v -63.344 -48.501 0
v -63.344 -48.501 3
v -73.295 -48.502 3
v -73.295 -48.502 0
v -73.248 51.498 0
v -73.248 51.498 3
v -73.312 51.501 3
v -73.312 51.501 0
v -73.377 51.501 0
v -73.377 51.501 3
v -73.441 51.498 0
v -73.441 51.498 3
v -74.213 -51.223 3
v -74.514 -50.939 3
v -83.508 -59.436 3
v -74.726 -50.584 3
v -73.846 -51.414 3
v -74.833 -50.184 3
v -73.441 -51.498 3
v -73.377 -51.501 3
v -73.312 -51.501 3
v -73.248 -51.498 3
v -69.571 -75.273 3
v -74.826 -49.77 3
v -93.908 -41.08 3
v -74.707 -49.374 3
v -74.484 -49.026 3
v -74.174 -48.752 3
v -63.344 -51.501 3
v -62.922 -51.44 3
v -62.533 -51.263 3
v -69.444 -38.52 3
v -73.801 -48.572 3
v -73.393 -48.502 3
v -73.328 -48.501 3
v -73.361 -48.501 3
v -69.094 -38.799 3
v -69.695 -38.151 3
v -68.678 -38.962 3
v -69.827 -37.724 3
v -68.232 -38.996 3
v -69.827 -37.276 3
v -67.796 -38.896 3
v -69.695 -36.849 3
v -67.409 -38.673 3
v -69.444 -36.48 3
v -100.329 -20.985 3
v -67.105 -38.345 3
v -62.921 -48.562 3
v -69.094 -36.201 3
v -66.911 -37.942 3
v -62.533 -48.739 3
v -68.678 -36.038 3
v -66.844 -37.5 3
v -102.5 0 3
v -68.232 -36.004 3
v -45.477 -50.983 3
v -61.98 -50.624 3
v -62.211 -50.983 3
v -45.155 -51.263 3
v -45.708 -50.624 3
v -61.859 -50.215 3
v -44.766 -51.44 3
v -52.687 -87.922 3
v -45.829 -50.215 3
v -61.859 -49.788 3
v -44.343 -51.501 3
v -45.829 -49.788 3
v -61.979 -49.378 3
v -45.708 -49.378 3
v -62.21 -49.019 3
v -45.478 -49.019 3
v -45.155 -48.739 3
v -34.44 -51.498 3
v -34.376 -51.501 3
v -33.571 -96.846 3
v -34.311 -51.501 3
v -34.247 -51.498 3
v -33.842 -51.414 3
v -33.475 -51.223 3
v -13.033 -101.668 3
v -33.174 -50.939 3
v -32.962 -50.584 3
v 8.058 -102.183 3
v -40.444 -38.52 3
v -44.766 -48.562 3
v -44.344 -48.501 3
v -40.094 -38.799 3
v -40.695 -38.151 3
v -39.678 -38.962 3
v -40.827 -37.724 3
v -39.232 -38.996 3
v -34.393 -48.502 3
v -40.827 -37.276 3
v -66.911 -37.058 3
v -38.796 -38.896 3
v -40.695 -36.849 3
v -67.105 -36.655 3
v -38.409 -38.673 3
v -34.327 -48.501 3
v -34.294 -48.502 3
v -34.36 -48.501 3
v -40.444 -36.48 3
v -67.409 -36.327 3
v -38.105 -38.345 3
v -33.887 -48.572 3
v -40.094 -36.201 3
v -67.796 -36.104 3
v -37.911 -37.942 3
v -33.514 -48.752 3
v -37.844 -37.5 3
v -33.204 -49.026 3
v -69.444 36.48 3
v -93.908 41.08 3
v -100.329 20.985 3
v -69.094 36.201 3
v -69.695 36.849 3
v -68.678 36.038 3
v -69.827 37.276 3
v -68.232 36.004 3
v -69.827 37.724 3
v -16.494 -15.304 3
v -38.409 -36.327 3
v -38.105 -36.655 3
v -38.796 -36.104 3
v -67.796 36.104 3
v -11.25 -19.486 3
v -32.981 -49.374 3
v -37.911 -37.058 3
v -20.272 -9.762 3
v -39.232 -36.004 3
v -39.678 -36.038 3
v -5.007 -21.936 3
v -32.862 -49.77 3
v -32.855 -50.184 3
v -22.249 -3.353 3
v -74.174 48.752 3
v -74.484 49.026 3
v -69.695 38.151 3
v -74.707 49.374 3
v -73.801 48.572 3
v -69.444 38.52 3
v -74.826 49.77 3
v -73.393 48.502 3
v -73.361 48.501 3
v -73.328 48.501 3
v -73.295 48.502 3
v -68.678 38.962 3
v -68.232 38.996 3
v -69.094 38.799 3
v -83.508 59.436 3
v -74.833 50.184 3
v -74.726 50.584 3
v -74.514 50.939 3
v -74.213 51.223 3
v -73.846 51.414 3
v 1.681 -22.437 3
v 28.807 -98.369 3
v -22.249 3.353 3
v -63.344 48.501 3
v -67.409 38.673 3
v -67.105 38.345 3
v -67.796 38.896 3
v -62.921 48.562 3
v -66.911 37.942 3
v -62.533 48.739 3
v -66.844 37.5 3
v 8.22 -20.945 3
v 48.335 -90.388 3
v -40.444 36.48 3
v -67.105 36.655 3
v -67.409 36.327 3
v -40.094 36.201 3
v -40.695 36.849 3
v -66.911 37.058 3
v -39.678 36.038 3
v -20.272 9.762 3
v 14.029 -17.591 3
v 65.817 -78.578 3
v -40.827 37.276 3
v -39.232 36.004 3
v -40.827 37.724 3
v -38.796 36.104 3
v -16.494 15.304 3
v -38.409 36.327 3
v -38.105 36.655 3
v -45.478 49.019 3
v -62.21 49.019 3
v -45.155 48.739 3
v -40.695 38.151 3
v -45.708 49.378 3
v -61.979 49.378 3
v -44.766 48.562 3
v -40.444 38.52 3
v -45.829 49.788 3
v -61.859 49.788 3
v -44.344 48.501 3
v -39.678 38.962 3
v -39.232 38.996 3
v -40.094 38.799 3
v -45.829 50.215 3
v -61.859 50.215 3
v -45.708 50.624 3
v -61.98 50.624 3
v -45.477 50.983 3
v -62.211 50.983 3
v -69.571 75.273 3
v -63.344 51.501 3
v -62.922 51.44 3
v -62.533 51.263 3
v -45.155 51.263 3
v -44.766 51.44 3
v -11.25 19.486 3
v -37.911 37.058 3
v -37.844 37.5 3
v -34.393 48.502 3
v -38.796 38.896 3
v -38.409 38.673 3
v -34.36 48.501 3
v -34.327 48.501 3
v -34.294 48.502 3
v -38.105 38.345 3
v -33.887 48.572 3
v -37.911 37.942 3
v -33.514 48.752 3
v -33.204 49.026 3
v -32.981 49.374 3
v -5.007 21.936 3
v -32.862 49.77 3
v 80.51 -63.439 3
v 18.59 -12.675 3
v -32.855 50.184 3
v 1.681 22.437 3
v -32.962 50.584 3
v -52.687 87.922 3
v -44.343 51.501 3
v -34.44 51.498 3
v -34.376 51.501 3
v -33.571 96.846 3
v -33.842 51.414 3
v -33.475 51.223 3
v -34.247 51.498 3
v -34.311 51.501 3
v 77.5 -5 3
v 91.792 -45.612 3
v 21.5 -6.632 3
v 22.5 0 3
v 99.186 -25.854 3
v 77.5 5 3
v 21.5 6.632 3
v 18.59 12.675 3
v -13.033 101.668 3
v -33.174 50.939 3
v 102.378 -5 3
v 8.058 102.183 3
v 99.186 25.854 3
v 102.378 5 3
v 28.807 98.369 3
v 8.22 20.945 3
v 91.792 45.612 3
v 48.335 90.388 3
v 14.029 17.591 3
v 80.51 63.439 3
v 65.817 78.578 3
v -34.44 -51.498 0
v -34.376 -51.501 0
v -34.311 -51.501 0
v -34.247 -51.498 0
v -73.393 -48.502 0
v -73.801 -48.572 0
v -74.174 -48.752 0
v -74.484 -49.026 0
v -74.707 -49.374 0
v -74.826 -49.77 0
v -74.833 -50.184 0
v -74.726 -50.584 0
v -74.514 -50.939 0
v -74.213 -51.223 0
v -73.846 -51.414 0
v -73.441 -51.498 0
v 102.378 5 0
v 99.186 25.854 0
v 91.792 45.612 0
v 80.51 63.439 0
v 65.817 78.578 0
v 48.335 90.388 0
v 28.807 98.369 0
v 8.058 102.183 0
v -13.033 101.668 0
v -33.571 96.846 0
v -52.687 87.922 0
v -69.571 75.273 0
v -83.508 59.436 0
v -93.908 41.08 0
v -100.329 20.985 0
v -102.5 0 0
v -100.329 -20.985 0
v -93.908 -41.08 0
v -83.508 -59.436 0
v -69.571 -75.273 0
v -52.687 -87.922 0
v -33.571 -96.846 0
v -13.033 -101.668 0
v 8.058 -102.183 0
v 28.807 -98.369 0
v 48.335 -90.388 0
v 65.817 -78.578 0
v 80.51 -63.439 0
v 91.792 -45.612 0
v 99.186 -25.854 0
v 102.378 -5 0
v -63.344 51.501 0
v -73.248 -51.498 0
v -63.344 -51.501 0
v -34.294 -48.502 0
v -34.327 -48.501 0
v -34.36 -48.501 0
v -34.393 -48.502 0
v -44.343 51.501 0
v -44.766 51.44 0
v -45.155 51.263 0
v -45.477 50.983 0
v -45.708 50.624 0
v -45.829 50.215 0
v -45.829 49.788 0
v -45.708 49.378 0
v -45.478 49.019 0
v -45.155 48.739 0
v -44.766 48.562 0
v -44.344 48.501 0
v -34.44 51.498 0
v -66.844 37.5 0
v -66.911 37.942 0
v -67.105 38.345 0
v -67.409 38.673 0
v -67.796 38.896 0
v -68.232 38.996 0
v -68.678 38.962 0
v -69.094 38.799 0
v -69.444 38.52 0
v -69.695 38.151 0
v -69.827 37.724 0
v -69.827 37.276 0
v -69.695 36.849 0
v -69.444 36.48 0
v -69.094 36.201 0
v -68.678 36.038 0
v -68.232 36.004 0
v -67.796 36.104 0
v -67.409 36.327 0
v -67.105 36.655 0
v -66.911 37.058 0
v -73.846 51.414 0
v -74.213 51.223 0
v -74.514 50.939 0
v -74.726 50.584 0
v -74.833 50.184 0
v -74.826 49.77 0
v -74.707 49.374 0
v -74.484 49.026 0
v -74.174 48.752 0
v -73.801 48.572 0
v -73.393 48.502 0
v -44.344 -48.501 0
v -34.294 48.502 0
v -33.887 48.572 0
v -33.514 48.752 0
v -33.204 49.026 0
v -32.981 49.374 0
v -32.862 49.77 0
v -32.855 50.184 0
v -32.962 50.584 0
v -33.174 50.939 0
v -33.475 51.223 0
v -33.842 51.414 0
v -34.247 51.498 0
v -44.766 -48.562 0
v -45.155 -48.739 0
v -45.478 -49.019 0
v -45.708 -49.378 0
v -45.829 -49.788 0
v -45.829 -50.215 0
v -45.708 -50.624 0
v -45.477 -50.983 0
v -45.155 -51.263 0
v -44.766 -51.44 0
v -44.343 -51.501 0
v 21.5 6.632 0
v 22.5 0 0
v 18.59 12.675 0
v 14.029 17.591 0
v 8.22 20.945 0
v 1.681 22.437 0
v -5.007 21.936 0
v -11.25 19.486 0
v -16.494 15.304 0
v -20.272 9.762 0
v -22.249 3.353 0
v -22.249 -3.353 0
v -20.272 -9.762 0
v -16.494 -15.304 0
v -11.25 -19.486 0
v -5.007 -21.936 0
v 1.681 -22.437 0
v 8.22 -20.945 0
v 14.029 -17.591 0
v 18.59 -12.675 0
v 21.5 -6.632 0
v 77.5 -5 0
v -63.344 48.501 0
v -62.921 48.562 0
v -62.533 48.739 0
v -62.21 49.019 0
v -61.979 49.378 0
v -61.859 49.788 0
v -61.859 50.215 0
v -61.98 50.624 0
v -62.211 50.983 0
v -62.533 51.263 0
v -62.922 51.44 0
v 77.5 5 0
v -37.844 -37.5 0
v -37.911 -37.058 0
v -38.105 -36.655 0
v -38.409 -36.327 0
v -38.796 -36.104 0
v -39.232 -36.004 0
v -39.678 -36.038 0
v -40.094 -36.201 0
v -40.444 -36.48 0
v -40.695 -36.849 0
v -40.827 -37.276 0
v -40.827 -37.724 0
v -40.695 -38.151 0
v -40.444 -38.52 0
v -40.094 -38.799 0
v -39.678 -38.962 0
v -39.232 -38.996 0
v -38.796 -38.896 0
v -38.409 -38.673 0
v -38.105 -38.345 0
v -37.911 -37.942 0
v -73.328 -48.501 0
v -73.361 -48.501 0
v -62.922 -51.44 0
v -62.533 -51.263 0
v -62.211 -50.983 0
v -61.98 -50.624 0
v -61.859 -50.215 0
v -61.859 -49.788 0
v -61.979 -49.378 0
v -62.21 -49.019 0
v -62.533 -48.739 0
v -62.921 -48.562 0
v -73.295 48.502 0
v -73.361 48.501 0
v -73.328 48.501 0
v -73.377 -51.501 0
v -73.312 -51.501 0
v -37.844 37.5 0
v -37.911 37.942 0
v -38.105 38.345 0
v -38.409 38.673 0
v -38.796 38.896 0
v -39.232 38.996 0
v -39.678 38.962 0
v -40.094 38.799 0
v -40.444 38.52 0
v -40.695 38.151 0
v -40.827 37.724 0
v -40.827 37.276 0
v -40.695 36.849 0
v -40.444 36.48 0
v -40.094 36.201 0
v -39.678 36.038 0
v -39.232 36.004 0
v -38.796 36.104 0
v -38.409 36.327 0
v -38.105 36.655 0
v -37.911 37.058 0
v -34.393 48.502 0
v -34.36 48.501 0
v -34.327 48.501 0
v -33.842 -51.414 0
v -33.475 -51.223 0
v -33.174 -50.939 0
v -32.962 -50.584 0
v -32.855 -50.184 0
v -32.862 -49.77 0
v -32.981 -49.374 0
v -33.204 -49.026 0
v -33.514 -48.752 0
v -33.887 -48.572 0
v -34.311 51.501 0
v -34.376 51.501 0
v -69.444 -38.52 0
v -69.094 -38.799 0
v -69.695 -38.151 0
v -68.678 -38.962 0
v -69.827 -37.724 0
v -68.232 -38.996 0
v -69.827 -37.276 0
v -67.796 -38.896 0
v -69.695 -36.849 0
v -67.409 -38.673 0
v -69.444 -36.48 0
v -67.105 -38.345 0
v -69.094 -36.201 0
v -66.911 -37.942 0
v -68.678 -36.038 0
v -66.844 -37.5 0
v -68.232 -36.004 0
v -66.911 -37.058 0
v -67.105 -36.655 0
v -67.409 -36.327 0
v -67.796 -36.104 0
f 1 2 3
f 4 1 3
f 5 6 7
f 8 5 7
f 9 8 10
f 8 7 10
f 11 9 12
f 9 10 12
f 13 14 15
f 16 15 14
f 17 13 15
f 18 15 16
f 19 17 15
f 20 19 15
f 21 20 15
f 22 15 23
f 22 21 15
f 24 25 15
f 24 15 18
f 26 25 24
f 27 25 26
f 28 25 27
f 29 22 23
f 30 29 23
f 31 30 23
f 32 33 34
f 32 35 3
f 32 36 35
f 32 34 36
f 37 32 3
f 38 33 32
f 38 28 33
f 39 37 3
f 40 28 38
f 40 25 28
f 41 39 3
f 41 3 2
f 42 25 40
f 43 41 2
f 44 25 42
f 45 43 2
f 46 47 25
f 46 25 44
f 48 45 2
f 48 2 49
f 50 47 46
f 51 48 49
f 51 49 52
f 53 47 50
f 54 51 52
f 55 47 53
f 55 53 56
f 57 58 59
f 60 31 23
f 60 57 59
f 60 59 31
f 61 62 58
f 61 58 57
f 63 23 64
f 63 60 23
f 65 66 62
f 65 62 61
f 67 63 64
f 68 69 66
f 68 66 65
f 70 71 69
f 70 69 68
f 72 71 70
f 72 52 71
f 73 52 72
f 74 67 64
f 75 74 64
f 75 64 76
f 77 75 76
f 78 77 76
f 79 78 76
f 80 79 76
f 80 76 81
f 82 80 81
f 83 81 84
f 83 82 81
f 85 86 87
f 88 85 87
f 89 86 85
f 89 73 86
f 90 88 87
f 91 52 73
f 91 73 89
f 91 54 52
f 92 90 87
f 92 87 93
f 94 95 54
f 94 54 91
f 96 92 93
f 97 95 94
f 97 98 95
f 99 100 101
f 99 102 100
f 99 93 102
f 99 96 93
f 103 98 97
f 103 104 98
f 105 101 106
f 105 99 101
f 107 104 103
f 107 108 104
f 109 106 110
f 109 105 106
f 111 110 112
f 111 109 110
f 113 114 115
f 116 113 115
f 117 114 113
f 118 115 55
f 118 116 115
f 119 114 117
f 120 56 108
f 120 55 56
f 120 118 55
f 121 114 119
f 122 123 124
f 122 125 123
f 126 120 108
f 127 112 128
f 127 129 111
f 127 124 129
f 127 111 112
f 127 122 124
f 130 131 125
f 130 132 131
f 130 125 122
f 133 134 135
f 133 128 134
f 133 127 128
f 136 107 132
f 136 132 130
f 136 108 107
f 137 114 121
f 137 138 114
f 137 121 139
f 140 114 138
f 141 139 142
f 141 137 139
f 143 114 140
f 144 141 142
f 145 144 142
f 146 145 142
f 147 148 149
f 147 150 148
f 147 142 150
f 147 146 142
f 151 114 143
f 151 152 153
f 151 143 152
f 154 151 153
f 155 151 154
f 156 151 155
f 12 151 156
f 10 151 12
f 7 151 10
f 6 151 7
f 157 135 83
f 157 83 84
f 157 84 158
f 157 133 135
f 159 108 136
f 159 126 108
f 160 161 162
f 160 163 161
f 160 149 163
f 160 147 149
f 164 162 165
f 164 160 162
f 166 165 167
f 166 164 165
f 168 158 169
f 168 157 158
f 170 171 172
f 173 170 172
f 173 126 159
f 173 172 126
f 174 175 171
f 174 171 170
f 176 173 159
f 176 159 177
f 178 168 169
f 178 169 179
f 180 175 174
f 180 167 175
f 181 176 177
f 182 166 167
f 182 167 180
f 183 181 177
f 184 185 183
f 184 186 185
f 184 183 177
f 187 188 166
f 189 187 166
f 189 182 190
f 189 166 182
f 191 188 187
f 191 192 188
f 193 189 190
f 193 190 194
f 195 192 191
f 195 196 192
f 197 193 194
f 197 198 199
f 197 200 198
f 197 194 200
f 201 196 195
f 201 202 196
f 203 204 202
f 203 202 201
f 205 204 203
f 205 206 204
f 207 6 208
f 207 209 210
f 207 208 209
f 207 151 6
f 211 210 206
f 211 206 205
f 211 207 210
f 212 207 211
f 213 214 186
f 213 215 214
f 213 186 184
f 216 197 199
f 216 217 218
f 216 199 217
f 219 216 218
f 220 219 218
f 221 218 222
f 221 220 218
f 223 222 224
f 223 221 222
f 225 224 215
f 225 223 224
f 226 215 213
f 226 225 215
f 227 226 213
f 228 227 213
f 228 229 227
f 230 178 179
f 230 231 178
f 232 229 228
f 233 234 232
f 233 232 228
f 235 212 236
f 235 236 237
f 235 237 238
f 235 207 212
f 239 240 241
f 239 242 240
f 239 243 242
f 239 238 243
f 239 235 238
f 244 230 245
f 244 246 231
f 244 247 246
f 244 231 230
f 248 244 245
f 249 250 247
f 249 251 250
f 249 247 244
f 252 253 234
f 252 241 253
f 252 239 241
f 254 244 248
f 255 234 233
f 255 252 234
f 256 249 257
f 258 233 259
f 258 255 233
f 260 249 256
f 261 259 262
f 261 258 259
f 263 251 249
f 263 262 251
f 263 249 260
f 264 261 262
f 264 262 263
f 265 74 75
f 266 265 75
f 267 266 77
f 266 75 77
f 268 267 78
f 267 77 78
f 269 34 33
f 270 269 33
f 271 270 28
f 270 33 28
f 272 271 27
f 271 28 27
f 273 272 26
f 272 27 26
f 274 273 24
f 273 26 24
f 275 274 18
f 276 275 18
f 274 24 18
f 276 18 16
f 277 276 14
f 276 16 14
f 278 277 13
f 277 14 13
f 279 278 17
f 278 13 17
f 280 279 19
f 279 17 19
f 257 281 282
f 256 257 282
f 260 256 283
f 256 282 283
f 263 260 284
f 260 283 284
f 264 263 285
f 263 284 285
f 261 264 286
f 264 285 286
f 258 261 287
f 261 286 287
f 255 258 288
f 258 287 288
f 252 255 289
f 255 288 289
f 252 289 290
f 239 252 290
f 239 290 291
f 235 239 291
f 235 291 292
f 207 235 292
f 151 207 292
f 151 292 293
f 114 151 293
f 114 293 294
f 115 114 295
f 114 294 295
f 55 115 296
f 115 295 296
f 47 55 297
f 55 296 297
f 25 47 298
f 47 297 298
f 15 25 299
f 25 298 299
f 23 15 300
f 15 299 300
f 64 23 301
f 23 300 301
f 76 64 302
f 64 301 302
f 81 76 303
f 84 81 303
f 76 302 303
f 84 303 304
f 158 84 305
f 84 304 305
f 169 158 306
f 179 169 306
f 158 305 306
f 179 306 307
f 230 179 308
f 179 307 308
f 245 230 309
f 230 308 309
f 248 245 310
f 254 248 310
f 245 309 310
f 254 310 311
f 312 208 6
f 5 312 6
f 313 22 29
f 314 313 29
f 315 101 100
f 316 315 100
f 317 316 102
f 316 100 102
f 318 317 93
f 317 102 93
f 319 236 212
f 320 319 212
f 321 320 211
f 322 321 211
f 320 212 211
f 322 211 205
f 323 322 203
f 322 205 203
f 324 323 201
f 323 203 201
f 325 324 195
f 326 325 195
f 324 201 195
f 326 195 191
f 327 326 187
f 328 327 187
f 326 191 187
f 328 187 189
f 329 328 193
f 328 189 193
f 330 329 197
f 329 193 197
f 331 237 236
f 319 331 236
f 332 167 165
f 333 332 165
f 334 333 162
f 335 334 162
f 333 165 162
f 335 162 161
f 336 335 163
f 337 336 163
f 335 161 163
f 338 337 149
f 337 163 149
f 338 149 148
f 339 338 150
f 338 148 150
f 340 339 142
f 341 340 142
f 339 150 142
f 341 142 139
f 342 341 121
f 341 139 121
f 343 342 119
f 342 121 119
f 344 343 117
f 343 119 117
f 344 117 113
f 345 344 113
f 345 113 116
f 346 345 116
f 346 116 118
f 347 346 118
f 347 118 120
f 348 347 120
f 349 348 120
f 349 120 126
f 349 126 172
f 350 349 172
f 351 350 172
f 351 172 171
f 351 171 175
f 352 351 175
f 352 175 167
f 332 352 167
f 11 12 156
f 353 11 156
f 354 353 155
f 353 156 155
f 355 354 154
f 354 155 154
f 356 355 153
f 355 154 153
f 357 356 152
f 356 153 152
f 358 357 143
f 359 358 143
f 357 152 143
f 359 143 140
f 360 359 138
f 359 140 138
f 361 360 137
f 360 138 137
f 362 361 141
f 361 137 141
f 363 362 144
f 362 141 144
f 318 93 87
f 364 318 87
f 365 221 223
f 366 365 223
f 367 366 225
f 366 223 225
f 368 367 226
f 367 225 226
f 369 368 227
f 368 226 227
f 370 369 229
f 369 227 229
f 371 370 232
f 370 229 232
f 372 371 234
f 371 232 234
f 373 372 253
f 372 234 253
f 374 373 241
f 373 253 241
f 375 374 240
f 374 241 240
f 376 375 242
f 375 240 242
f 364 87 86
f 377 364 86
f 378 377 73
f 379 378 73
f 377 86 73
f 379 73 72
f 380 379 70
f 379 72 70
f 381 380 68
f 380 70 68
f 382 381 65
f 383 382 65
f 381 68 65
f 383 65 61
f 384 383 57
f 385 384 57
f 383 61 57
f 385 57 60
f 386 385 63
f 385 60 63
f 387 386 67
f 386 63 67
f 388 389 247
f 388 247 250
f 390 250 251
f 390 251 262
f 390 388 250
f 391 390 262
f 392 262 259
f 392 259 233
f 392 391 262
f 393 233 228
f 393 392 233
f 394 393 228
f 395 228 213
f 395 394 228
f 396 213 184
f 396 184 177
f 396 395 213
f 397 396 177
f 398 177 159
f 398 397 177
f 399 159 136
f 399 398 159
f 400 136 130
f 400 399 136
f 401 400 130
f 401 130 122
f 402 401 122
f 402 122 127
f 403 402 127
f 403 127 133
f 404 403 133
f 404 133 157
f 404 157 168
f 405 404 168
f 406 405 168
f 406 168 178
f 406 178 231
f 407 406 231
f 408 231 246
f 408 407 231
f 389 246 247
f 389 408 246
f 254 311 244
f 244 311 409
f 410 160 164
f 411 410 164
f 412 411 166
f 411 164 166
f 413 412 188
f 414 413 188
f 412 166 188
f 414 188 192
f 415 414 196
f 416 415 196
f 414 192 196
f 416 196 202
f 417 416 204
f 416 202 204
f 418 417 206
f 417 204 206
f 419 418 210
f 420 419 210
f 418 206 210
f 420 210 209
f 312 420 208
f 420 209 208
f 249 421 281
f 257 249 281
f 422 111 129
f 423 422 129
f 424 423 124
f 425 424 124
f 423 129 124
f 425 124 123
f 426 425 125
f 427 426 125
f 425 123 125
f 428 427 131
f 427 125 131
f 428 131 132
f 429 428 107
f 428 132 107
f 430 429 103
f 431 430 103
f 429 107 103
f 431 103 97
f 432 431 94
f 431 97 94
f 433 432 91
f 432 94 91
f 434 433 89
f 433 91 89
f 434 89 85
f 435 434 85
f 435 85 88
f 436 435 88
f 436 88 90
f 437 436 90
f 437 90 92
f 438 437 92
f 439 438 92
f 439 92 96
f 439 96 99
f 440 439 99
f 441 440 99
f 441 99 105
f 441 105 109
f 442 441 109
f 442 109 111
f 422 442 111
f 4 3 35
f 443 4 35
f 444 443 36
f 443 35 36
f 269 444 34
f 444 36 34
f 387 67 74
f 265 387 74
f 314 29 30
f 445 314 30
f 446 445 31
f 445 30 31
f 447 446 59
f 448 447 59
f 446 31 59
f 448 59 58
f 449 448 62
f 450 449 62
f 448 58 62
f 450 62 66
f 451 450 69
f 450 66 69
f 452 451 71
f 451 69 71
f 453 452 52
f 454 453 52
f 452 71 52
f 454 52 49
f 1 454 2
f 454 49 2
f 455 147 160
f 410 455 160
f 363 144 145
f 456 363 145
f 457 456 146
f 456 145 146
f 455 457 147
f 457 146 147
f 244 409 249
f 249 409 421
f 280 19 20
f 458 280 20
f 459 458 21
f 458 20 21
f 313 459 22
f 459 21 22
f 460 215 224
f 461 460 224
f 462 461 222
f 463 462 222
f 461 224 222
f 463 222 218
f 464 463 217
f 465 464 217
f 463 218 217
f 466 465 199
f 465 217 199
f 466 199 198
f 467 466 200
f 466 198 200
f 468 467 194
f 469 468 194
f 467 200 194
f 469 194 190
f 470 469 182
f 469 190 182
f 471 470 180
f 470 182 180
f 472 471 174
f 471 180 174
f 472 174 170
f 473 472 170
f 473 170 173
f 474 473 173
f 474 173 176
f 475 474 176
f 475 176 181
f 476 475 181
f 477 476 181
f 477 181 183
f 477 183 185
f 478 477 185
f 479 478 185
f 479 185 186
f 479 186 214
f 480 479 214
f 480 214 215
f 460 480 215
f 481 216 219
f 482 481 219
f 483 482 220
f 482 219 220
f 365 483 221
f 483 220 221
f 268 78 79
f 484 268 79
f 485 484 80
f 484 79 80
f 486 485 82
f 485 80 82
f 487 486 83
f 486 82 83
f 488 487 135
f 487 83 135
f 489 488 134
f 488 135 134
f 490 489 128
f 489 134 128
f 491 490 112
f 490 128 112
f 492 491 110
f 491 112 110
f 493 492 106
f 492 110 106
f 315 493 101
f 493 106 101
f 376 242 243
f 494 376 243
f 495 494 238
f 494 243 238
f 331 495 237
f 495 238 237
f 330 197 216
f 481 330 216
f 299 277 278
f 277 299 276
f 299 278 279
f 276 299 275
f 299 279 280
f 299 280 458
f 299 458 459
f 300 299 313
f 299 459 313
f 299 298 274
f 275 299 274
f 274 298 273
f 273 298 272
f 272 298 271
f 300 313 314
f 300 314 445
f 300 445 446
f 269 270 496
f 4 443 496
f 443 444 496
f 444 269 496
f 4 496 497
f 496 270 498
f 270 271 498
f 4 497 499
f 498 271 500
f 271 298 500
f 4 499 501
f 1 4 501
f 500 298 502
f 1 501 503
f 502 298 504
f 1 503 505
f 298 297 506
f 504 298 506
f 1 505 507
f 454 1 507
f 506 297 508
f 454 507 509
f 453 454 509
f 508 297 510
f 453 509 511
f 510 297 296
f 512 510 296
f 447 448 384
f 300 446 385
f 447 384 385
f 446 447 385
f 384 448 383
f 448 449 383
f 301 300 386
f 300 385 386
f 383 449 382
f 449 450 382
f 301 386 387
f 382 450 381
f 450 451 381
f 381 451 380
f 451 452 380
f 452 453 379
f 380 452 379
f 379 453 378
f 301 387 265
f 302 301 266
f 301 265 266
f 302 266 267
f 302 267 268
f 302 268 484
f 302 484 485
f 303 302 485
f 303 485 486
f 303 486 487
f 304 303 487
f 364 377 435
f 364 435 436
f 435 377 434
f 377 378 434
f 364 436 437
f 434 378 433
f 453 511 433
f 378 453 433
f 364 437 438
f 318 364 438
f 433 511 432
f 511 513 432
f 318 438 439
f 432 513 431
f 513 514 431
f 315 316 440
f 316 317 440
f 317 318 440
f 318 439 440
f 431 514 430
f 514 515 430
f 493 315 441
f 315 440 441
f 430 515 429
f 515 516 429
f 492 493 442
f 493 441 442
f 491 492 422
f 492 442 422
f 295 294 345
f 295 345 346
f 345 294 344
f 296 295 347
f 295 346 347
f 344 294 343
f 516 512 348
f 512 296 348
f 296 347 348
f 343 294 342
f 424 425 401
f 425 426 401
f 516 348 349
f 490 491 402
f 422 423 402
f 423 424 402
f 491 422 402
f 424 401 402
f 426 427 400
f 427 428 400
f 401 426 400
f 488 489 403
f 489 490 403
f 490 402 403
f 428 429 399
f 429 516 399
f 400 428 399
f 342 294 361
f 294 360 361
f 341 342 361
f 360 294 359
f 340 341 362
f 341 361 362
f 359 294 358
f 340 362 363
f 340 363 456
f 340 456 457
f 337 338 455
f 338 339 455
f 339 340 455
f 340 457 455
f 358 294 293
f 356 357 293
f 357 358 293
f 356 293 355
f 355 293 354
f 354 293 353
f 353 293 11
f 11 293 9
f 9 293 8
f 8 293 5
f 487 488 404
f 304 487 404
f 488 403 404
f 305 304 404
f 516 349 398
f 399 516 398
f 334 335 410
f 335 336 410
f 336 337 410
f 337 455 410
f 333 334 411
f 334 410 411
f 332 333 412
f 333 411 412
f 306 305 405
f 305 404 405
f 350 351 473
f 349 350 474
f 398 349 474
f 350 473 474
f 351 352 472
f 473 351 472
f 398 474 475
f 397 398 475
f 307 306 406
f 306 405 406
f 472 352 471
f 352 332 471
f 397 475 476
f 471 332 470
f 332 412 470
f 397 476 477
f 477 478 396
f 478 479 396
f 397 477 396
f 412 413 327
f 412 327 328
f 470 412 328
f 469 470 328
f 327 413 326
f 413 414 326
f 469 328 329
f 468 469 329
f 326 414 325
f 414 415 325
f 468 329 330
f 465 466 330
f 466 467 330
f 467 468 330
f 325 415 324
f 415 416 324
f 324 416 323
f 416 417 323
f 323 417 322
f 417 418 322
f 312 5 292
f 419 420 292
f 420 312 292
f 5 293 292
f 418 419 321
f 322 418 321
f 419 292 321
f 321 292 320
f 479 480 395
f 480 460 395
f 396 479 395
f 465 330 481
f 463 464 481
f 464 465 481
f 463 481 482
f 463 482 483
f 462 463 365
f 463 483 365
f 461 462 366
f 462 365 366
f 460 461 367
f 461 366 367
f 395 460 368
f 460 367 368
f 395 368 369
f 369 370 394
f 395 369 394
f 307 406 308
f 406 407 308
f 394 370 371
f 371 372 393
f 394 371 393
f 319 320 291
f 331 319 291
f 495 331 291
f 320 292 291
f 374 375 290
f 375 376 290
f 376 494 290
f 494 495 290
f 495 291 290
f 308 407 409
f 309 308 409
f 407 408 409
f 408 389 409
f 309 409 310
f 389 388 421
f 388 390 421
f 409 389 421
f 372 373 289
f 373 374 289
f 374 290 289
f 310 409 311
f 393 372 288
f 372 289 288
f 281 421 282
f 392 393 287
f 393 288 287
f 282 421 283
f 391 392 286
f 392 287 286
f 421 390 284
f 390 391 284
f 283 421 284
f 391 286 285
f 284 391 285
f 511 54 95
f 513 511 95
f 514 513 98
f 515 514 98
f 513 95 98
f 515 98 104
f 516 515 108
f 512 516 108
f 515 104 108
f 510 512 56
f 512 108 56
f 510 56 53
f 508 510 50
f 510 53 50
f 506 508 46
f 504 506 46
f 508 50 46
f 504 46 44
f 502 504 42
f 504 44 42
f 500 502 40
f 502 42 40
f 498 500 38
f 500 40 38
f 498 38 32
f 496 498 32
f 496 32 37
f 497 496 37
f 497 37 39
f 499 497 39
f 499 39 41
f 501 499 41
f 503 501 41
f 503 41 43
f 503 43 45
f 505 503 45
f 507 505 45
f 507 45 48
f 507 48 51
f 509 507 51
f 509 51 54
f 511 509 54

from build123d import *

# Parameters (mm, degrees)
F0_R     = 22.5
F1_DEPTH = 3
F2_R     = 1.5
F3_DEPTH = 25


with BuildPart() as f1:
    # F0 (on Top) → F1 (new body)
    with BuildSketch(Plane.XY):
        with BuildLine():
            Line((77.5, 5), (102.377976, 5))
            ThreePointArc((102.377976, 5), (-102.5, 0), (102.377976, -5))
            Line((102.377976, -5), (77.5, -5))
            Line((77.5, -5), (77.5, 5))
        make_face()
        Circle(F0_R, mode=Mode.SUBTRACT)
    extrude(amount=F1_DEPTH)

    # F2 (on face) → F3 (cut)
    with BuildSketch(Plane.XY.offset(3)):
        with Locations((-68.34396, 37.5)):
            Circle(F2_R)
        with Locations((-39.34396, 37.5)):
            Circle(F2_R)
        with Locations((-39.34396, -37.5)):
            Circle(F2_R)
        with Locations((-68.34396, -37.5)):
            Circle(F2_R)
        with BuildLine():
            Line((-73.44097, 51.497755), (-73.247881, 51.497815))
            ThreePointArc((-73.247881, 51.497815), (-73.344427, 51.500895), (-73.44097, 51.497755))
        make_face()
        with BuildLine():
            Line((-63.344427, 51.500895), (-73.247881, 51.497815))
            Line((-73.247881, 51.497815), (-73.44097, 51.497755))
            ThreePointArc((-73.44097, 51.497755), (-74.843772, 49.977117), (-73.393472, 48.501712))
            Line((-73.393472, 48.501712), (-73.294692, 48.501704))
            Line((-73.294692, 48.501704), (-63.344082, 48.500895))
            ThreePointArc((-63.344082, 48.500895), (-61.84396, 50.001067), (-63.344427, 51.500895))
        make_face()
        with BuildLine():
            Line((-73.294692, 48.501704), (-73.393472, 48.501712))
            ThreePointArc((-73.393472, 48.501712), (-73.344082, 48.500895), (-73.294692, 48.501704))
        make_face()
        with BuildLine():
            ThreePointArc((-34.294448, 48.501712), (-32.844149, 49.977117), (-34.24695, 51.497755))
            Line((-34.24695, 51.497755), (-34.440039, 51.497815))
            Line((-34.440039, 51.497815), (-44.343494, 51.500895))
            ThreePointArc((-44.343494, 51.500895), (-45.84396, 50.001067), (-44.343838, 48.500895))
            Line((-44.343838, 48.500895), (-34.393228, 48.501704))
            Line((-34.393228, 48.501704), (-34.294448, 48.501712))
        make_face()
        with BuildLine():
            Line((-34.440039, 51.497815), (-34.24695, 51.497755))
            ThreePointArc((-34.24695, 51.497755), (-34.343494, 51.500895), (-34.440039, 51.497815))
        make_face()
        with BuildLine():
            ThreePointArc((-34.393228, 48.501704), (-34.343838, 48.500895), (-34.294448, 48.501712))
            Line((-34.294448, 48.501712), (-34.393228, 48.501704))
        make_face()
        with BuildLine():
            ThreePointArc((-34.440039, -51.497815), (-34.343494, -51.500895), (-34.24695, -51.497755))
            Line((-34.24695, -51.497755), (-34.440039, -51.497815))
        make_face()
        with BuildLine():
            Line((-34.440039, -51.497815), (-34.24695, -51.497755))
            ThreePointArc((-34.24695, -51.497755), (-32.844149, -49.977117), (-34.294448, -48.501712))
            Line((-34.294448, -48.501712), (-34.393228, -48.501704))
            Line((-34.393228, -48.501704), (-44.343838, -48.500895))
            ThreePointArc((-44.343838, -48.500895), (-45.84396, -50.001067), (-44.343494, -51.500895))
            Line((-44.343494, -51.500895), (-34.440039, -51.497815))
        make_face()
        with BuildLine():
            Line((-34.393228, -48.501704), (-34.294448, -48.501712))
            ThreePointArc((-34.294448, -48.501712), (-34.343838, -48.500895), (-34.393228, -48.501704))
        make_face()
        with BuildLine():
            ThreePointArc((-73.44097, -51.497755), (-73.344427, -51.500895), (-73.247881, -51.497815))
            Line((-73.247881, -51.497815), (-73.44097, -51.497755))
        make_face()
        with BuildLine():
            Line((-73.44097, -51.497755), (-73.247881, -51.497815))
            Line((-73.247881, -51.497815), (-63.344427, -51.500895))
            ThreePointArc((-63.344427, -51.500895), (-61.84396, -50.001067), (-63.344082, -48.500895))
            Line((-63.344082, -48.500895), (-73.294692, -48.501704))
            Line((-73.294692, -48.501704), (-73.393472, -48.501712))
            ThreePointArc((-73.393472, -48.501712), (-74.843772, -49.977117), (-73.44097, -51.497755))
        make_face()
        with BuildLine():
            ThreePointArc((-73.294692, -48.501704), (-73.344082, -48.500895), (-73.393472, -48.501712))
            Line((-73.393472, -48.501712), (-73.294692, -48.501704))
        make_face()
    extrude(amount=-F3_DEPTH, mode=Mode.SUBTRACT)


solid = f1.part
